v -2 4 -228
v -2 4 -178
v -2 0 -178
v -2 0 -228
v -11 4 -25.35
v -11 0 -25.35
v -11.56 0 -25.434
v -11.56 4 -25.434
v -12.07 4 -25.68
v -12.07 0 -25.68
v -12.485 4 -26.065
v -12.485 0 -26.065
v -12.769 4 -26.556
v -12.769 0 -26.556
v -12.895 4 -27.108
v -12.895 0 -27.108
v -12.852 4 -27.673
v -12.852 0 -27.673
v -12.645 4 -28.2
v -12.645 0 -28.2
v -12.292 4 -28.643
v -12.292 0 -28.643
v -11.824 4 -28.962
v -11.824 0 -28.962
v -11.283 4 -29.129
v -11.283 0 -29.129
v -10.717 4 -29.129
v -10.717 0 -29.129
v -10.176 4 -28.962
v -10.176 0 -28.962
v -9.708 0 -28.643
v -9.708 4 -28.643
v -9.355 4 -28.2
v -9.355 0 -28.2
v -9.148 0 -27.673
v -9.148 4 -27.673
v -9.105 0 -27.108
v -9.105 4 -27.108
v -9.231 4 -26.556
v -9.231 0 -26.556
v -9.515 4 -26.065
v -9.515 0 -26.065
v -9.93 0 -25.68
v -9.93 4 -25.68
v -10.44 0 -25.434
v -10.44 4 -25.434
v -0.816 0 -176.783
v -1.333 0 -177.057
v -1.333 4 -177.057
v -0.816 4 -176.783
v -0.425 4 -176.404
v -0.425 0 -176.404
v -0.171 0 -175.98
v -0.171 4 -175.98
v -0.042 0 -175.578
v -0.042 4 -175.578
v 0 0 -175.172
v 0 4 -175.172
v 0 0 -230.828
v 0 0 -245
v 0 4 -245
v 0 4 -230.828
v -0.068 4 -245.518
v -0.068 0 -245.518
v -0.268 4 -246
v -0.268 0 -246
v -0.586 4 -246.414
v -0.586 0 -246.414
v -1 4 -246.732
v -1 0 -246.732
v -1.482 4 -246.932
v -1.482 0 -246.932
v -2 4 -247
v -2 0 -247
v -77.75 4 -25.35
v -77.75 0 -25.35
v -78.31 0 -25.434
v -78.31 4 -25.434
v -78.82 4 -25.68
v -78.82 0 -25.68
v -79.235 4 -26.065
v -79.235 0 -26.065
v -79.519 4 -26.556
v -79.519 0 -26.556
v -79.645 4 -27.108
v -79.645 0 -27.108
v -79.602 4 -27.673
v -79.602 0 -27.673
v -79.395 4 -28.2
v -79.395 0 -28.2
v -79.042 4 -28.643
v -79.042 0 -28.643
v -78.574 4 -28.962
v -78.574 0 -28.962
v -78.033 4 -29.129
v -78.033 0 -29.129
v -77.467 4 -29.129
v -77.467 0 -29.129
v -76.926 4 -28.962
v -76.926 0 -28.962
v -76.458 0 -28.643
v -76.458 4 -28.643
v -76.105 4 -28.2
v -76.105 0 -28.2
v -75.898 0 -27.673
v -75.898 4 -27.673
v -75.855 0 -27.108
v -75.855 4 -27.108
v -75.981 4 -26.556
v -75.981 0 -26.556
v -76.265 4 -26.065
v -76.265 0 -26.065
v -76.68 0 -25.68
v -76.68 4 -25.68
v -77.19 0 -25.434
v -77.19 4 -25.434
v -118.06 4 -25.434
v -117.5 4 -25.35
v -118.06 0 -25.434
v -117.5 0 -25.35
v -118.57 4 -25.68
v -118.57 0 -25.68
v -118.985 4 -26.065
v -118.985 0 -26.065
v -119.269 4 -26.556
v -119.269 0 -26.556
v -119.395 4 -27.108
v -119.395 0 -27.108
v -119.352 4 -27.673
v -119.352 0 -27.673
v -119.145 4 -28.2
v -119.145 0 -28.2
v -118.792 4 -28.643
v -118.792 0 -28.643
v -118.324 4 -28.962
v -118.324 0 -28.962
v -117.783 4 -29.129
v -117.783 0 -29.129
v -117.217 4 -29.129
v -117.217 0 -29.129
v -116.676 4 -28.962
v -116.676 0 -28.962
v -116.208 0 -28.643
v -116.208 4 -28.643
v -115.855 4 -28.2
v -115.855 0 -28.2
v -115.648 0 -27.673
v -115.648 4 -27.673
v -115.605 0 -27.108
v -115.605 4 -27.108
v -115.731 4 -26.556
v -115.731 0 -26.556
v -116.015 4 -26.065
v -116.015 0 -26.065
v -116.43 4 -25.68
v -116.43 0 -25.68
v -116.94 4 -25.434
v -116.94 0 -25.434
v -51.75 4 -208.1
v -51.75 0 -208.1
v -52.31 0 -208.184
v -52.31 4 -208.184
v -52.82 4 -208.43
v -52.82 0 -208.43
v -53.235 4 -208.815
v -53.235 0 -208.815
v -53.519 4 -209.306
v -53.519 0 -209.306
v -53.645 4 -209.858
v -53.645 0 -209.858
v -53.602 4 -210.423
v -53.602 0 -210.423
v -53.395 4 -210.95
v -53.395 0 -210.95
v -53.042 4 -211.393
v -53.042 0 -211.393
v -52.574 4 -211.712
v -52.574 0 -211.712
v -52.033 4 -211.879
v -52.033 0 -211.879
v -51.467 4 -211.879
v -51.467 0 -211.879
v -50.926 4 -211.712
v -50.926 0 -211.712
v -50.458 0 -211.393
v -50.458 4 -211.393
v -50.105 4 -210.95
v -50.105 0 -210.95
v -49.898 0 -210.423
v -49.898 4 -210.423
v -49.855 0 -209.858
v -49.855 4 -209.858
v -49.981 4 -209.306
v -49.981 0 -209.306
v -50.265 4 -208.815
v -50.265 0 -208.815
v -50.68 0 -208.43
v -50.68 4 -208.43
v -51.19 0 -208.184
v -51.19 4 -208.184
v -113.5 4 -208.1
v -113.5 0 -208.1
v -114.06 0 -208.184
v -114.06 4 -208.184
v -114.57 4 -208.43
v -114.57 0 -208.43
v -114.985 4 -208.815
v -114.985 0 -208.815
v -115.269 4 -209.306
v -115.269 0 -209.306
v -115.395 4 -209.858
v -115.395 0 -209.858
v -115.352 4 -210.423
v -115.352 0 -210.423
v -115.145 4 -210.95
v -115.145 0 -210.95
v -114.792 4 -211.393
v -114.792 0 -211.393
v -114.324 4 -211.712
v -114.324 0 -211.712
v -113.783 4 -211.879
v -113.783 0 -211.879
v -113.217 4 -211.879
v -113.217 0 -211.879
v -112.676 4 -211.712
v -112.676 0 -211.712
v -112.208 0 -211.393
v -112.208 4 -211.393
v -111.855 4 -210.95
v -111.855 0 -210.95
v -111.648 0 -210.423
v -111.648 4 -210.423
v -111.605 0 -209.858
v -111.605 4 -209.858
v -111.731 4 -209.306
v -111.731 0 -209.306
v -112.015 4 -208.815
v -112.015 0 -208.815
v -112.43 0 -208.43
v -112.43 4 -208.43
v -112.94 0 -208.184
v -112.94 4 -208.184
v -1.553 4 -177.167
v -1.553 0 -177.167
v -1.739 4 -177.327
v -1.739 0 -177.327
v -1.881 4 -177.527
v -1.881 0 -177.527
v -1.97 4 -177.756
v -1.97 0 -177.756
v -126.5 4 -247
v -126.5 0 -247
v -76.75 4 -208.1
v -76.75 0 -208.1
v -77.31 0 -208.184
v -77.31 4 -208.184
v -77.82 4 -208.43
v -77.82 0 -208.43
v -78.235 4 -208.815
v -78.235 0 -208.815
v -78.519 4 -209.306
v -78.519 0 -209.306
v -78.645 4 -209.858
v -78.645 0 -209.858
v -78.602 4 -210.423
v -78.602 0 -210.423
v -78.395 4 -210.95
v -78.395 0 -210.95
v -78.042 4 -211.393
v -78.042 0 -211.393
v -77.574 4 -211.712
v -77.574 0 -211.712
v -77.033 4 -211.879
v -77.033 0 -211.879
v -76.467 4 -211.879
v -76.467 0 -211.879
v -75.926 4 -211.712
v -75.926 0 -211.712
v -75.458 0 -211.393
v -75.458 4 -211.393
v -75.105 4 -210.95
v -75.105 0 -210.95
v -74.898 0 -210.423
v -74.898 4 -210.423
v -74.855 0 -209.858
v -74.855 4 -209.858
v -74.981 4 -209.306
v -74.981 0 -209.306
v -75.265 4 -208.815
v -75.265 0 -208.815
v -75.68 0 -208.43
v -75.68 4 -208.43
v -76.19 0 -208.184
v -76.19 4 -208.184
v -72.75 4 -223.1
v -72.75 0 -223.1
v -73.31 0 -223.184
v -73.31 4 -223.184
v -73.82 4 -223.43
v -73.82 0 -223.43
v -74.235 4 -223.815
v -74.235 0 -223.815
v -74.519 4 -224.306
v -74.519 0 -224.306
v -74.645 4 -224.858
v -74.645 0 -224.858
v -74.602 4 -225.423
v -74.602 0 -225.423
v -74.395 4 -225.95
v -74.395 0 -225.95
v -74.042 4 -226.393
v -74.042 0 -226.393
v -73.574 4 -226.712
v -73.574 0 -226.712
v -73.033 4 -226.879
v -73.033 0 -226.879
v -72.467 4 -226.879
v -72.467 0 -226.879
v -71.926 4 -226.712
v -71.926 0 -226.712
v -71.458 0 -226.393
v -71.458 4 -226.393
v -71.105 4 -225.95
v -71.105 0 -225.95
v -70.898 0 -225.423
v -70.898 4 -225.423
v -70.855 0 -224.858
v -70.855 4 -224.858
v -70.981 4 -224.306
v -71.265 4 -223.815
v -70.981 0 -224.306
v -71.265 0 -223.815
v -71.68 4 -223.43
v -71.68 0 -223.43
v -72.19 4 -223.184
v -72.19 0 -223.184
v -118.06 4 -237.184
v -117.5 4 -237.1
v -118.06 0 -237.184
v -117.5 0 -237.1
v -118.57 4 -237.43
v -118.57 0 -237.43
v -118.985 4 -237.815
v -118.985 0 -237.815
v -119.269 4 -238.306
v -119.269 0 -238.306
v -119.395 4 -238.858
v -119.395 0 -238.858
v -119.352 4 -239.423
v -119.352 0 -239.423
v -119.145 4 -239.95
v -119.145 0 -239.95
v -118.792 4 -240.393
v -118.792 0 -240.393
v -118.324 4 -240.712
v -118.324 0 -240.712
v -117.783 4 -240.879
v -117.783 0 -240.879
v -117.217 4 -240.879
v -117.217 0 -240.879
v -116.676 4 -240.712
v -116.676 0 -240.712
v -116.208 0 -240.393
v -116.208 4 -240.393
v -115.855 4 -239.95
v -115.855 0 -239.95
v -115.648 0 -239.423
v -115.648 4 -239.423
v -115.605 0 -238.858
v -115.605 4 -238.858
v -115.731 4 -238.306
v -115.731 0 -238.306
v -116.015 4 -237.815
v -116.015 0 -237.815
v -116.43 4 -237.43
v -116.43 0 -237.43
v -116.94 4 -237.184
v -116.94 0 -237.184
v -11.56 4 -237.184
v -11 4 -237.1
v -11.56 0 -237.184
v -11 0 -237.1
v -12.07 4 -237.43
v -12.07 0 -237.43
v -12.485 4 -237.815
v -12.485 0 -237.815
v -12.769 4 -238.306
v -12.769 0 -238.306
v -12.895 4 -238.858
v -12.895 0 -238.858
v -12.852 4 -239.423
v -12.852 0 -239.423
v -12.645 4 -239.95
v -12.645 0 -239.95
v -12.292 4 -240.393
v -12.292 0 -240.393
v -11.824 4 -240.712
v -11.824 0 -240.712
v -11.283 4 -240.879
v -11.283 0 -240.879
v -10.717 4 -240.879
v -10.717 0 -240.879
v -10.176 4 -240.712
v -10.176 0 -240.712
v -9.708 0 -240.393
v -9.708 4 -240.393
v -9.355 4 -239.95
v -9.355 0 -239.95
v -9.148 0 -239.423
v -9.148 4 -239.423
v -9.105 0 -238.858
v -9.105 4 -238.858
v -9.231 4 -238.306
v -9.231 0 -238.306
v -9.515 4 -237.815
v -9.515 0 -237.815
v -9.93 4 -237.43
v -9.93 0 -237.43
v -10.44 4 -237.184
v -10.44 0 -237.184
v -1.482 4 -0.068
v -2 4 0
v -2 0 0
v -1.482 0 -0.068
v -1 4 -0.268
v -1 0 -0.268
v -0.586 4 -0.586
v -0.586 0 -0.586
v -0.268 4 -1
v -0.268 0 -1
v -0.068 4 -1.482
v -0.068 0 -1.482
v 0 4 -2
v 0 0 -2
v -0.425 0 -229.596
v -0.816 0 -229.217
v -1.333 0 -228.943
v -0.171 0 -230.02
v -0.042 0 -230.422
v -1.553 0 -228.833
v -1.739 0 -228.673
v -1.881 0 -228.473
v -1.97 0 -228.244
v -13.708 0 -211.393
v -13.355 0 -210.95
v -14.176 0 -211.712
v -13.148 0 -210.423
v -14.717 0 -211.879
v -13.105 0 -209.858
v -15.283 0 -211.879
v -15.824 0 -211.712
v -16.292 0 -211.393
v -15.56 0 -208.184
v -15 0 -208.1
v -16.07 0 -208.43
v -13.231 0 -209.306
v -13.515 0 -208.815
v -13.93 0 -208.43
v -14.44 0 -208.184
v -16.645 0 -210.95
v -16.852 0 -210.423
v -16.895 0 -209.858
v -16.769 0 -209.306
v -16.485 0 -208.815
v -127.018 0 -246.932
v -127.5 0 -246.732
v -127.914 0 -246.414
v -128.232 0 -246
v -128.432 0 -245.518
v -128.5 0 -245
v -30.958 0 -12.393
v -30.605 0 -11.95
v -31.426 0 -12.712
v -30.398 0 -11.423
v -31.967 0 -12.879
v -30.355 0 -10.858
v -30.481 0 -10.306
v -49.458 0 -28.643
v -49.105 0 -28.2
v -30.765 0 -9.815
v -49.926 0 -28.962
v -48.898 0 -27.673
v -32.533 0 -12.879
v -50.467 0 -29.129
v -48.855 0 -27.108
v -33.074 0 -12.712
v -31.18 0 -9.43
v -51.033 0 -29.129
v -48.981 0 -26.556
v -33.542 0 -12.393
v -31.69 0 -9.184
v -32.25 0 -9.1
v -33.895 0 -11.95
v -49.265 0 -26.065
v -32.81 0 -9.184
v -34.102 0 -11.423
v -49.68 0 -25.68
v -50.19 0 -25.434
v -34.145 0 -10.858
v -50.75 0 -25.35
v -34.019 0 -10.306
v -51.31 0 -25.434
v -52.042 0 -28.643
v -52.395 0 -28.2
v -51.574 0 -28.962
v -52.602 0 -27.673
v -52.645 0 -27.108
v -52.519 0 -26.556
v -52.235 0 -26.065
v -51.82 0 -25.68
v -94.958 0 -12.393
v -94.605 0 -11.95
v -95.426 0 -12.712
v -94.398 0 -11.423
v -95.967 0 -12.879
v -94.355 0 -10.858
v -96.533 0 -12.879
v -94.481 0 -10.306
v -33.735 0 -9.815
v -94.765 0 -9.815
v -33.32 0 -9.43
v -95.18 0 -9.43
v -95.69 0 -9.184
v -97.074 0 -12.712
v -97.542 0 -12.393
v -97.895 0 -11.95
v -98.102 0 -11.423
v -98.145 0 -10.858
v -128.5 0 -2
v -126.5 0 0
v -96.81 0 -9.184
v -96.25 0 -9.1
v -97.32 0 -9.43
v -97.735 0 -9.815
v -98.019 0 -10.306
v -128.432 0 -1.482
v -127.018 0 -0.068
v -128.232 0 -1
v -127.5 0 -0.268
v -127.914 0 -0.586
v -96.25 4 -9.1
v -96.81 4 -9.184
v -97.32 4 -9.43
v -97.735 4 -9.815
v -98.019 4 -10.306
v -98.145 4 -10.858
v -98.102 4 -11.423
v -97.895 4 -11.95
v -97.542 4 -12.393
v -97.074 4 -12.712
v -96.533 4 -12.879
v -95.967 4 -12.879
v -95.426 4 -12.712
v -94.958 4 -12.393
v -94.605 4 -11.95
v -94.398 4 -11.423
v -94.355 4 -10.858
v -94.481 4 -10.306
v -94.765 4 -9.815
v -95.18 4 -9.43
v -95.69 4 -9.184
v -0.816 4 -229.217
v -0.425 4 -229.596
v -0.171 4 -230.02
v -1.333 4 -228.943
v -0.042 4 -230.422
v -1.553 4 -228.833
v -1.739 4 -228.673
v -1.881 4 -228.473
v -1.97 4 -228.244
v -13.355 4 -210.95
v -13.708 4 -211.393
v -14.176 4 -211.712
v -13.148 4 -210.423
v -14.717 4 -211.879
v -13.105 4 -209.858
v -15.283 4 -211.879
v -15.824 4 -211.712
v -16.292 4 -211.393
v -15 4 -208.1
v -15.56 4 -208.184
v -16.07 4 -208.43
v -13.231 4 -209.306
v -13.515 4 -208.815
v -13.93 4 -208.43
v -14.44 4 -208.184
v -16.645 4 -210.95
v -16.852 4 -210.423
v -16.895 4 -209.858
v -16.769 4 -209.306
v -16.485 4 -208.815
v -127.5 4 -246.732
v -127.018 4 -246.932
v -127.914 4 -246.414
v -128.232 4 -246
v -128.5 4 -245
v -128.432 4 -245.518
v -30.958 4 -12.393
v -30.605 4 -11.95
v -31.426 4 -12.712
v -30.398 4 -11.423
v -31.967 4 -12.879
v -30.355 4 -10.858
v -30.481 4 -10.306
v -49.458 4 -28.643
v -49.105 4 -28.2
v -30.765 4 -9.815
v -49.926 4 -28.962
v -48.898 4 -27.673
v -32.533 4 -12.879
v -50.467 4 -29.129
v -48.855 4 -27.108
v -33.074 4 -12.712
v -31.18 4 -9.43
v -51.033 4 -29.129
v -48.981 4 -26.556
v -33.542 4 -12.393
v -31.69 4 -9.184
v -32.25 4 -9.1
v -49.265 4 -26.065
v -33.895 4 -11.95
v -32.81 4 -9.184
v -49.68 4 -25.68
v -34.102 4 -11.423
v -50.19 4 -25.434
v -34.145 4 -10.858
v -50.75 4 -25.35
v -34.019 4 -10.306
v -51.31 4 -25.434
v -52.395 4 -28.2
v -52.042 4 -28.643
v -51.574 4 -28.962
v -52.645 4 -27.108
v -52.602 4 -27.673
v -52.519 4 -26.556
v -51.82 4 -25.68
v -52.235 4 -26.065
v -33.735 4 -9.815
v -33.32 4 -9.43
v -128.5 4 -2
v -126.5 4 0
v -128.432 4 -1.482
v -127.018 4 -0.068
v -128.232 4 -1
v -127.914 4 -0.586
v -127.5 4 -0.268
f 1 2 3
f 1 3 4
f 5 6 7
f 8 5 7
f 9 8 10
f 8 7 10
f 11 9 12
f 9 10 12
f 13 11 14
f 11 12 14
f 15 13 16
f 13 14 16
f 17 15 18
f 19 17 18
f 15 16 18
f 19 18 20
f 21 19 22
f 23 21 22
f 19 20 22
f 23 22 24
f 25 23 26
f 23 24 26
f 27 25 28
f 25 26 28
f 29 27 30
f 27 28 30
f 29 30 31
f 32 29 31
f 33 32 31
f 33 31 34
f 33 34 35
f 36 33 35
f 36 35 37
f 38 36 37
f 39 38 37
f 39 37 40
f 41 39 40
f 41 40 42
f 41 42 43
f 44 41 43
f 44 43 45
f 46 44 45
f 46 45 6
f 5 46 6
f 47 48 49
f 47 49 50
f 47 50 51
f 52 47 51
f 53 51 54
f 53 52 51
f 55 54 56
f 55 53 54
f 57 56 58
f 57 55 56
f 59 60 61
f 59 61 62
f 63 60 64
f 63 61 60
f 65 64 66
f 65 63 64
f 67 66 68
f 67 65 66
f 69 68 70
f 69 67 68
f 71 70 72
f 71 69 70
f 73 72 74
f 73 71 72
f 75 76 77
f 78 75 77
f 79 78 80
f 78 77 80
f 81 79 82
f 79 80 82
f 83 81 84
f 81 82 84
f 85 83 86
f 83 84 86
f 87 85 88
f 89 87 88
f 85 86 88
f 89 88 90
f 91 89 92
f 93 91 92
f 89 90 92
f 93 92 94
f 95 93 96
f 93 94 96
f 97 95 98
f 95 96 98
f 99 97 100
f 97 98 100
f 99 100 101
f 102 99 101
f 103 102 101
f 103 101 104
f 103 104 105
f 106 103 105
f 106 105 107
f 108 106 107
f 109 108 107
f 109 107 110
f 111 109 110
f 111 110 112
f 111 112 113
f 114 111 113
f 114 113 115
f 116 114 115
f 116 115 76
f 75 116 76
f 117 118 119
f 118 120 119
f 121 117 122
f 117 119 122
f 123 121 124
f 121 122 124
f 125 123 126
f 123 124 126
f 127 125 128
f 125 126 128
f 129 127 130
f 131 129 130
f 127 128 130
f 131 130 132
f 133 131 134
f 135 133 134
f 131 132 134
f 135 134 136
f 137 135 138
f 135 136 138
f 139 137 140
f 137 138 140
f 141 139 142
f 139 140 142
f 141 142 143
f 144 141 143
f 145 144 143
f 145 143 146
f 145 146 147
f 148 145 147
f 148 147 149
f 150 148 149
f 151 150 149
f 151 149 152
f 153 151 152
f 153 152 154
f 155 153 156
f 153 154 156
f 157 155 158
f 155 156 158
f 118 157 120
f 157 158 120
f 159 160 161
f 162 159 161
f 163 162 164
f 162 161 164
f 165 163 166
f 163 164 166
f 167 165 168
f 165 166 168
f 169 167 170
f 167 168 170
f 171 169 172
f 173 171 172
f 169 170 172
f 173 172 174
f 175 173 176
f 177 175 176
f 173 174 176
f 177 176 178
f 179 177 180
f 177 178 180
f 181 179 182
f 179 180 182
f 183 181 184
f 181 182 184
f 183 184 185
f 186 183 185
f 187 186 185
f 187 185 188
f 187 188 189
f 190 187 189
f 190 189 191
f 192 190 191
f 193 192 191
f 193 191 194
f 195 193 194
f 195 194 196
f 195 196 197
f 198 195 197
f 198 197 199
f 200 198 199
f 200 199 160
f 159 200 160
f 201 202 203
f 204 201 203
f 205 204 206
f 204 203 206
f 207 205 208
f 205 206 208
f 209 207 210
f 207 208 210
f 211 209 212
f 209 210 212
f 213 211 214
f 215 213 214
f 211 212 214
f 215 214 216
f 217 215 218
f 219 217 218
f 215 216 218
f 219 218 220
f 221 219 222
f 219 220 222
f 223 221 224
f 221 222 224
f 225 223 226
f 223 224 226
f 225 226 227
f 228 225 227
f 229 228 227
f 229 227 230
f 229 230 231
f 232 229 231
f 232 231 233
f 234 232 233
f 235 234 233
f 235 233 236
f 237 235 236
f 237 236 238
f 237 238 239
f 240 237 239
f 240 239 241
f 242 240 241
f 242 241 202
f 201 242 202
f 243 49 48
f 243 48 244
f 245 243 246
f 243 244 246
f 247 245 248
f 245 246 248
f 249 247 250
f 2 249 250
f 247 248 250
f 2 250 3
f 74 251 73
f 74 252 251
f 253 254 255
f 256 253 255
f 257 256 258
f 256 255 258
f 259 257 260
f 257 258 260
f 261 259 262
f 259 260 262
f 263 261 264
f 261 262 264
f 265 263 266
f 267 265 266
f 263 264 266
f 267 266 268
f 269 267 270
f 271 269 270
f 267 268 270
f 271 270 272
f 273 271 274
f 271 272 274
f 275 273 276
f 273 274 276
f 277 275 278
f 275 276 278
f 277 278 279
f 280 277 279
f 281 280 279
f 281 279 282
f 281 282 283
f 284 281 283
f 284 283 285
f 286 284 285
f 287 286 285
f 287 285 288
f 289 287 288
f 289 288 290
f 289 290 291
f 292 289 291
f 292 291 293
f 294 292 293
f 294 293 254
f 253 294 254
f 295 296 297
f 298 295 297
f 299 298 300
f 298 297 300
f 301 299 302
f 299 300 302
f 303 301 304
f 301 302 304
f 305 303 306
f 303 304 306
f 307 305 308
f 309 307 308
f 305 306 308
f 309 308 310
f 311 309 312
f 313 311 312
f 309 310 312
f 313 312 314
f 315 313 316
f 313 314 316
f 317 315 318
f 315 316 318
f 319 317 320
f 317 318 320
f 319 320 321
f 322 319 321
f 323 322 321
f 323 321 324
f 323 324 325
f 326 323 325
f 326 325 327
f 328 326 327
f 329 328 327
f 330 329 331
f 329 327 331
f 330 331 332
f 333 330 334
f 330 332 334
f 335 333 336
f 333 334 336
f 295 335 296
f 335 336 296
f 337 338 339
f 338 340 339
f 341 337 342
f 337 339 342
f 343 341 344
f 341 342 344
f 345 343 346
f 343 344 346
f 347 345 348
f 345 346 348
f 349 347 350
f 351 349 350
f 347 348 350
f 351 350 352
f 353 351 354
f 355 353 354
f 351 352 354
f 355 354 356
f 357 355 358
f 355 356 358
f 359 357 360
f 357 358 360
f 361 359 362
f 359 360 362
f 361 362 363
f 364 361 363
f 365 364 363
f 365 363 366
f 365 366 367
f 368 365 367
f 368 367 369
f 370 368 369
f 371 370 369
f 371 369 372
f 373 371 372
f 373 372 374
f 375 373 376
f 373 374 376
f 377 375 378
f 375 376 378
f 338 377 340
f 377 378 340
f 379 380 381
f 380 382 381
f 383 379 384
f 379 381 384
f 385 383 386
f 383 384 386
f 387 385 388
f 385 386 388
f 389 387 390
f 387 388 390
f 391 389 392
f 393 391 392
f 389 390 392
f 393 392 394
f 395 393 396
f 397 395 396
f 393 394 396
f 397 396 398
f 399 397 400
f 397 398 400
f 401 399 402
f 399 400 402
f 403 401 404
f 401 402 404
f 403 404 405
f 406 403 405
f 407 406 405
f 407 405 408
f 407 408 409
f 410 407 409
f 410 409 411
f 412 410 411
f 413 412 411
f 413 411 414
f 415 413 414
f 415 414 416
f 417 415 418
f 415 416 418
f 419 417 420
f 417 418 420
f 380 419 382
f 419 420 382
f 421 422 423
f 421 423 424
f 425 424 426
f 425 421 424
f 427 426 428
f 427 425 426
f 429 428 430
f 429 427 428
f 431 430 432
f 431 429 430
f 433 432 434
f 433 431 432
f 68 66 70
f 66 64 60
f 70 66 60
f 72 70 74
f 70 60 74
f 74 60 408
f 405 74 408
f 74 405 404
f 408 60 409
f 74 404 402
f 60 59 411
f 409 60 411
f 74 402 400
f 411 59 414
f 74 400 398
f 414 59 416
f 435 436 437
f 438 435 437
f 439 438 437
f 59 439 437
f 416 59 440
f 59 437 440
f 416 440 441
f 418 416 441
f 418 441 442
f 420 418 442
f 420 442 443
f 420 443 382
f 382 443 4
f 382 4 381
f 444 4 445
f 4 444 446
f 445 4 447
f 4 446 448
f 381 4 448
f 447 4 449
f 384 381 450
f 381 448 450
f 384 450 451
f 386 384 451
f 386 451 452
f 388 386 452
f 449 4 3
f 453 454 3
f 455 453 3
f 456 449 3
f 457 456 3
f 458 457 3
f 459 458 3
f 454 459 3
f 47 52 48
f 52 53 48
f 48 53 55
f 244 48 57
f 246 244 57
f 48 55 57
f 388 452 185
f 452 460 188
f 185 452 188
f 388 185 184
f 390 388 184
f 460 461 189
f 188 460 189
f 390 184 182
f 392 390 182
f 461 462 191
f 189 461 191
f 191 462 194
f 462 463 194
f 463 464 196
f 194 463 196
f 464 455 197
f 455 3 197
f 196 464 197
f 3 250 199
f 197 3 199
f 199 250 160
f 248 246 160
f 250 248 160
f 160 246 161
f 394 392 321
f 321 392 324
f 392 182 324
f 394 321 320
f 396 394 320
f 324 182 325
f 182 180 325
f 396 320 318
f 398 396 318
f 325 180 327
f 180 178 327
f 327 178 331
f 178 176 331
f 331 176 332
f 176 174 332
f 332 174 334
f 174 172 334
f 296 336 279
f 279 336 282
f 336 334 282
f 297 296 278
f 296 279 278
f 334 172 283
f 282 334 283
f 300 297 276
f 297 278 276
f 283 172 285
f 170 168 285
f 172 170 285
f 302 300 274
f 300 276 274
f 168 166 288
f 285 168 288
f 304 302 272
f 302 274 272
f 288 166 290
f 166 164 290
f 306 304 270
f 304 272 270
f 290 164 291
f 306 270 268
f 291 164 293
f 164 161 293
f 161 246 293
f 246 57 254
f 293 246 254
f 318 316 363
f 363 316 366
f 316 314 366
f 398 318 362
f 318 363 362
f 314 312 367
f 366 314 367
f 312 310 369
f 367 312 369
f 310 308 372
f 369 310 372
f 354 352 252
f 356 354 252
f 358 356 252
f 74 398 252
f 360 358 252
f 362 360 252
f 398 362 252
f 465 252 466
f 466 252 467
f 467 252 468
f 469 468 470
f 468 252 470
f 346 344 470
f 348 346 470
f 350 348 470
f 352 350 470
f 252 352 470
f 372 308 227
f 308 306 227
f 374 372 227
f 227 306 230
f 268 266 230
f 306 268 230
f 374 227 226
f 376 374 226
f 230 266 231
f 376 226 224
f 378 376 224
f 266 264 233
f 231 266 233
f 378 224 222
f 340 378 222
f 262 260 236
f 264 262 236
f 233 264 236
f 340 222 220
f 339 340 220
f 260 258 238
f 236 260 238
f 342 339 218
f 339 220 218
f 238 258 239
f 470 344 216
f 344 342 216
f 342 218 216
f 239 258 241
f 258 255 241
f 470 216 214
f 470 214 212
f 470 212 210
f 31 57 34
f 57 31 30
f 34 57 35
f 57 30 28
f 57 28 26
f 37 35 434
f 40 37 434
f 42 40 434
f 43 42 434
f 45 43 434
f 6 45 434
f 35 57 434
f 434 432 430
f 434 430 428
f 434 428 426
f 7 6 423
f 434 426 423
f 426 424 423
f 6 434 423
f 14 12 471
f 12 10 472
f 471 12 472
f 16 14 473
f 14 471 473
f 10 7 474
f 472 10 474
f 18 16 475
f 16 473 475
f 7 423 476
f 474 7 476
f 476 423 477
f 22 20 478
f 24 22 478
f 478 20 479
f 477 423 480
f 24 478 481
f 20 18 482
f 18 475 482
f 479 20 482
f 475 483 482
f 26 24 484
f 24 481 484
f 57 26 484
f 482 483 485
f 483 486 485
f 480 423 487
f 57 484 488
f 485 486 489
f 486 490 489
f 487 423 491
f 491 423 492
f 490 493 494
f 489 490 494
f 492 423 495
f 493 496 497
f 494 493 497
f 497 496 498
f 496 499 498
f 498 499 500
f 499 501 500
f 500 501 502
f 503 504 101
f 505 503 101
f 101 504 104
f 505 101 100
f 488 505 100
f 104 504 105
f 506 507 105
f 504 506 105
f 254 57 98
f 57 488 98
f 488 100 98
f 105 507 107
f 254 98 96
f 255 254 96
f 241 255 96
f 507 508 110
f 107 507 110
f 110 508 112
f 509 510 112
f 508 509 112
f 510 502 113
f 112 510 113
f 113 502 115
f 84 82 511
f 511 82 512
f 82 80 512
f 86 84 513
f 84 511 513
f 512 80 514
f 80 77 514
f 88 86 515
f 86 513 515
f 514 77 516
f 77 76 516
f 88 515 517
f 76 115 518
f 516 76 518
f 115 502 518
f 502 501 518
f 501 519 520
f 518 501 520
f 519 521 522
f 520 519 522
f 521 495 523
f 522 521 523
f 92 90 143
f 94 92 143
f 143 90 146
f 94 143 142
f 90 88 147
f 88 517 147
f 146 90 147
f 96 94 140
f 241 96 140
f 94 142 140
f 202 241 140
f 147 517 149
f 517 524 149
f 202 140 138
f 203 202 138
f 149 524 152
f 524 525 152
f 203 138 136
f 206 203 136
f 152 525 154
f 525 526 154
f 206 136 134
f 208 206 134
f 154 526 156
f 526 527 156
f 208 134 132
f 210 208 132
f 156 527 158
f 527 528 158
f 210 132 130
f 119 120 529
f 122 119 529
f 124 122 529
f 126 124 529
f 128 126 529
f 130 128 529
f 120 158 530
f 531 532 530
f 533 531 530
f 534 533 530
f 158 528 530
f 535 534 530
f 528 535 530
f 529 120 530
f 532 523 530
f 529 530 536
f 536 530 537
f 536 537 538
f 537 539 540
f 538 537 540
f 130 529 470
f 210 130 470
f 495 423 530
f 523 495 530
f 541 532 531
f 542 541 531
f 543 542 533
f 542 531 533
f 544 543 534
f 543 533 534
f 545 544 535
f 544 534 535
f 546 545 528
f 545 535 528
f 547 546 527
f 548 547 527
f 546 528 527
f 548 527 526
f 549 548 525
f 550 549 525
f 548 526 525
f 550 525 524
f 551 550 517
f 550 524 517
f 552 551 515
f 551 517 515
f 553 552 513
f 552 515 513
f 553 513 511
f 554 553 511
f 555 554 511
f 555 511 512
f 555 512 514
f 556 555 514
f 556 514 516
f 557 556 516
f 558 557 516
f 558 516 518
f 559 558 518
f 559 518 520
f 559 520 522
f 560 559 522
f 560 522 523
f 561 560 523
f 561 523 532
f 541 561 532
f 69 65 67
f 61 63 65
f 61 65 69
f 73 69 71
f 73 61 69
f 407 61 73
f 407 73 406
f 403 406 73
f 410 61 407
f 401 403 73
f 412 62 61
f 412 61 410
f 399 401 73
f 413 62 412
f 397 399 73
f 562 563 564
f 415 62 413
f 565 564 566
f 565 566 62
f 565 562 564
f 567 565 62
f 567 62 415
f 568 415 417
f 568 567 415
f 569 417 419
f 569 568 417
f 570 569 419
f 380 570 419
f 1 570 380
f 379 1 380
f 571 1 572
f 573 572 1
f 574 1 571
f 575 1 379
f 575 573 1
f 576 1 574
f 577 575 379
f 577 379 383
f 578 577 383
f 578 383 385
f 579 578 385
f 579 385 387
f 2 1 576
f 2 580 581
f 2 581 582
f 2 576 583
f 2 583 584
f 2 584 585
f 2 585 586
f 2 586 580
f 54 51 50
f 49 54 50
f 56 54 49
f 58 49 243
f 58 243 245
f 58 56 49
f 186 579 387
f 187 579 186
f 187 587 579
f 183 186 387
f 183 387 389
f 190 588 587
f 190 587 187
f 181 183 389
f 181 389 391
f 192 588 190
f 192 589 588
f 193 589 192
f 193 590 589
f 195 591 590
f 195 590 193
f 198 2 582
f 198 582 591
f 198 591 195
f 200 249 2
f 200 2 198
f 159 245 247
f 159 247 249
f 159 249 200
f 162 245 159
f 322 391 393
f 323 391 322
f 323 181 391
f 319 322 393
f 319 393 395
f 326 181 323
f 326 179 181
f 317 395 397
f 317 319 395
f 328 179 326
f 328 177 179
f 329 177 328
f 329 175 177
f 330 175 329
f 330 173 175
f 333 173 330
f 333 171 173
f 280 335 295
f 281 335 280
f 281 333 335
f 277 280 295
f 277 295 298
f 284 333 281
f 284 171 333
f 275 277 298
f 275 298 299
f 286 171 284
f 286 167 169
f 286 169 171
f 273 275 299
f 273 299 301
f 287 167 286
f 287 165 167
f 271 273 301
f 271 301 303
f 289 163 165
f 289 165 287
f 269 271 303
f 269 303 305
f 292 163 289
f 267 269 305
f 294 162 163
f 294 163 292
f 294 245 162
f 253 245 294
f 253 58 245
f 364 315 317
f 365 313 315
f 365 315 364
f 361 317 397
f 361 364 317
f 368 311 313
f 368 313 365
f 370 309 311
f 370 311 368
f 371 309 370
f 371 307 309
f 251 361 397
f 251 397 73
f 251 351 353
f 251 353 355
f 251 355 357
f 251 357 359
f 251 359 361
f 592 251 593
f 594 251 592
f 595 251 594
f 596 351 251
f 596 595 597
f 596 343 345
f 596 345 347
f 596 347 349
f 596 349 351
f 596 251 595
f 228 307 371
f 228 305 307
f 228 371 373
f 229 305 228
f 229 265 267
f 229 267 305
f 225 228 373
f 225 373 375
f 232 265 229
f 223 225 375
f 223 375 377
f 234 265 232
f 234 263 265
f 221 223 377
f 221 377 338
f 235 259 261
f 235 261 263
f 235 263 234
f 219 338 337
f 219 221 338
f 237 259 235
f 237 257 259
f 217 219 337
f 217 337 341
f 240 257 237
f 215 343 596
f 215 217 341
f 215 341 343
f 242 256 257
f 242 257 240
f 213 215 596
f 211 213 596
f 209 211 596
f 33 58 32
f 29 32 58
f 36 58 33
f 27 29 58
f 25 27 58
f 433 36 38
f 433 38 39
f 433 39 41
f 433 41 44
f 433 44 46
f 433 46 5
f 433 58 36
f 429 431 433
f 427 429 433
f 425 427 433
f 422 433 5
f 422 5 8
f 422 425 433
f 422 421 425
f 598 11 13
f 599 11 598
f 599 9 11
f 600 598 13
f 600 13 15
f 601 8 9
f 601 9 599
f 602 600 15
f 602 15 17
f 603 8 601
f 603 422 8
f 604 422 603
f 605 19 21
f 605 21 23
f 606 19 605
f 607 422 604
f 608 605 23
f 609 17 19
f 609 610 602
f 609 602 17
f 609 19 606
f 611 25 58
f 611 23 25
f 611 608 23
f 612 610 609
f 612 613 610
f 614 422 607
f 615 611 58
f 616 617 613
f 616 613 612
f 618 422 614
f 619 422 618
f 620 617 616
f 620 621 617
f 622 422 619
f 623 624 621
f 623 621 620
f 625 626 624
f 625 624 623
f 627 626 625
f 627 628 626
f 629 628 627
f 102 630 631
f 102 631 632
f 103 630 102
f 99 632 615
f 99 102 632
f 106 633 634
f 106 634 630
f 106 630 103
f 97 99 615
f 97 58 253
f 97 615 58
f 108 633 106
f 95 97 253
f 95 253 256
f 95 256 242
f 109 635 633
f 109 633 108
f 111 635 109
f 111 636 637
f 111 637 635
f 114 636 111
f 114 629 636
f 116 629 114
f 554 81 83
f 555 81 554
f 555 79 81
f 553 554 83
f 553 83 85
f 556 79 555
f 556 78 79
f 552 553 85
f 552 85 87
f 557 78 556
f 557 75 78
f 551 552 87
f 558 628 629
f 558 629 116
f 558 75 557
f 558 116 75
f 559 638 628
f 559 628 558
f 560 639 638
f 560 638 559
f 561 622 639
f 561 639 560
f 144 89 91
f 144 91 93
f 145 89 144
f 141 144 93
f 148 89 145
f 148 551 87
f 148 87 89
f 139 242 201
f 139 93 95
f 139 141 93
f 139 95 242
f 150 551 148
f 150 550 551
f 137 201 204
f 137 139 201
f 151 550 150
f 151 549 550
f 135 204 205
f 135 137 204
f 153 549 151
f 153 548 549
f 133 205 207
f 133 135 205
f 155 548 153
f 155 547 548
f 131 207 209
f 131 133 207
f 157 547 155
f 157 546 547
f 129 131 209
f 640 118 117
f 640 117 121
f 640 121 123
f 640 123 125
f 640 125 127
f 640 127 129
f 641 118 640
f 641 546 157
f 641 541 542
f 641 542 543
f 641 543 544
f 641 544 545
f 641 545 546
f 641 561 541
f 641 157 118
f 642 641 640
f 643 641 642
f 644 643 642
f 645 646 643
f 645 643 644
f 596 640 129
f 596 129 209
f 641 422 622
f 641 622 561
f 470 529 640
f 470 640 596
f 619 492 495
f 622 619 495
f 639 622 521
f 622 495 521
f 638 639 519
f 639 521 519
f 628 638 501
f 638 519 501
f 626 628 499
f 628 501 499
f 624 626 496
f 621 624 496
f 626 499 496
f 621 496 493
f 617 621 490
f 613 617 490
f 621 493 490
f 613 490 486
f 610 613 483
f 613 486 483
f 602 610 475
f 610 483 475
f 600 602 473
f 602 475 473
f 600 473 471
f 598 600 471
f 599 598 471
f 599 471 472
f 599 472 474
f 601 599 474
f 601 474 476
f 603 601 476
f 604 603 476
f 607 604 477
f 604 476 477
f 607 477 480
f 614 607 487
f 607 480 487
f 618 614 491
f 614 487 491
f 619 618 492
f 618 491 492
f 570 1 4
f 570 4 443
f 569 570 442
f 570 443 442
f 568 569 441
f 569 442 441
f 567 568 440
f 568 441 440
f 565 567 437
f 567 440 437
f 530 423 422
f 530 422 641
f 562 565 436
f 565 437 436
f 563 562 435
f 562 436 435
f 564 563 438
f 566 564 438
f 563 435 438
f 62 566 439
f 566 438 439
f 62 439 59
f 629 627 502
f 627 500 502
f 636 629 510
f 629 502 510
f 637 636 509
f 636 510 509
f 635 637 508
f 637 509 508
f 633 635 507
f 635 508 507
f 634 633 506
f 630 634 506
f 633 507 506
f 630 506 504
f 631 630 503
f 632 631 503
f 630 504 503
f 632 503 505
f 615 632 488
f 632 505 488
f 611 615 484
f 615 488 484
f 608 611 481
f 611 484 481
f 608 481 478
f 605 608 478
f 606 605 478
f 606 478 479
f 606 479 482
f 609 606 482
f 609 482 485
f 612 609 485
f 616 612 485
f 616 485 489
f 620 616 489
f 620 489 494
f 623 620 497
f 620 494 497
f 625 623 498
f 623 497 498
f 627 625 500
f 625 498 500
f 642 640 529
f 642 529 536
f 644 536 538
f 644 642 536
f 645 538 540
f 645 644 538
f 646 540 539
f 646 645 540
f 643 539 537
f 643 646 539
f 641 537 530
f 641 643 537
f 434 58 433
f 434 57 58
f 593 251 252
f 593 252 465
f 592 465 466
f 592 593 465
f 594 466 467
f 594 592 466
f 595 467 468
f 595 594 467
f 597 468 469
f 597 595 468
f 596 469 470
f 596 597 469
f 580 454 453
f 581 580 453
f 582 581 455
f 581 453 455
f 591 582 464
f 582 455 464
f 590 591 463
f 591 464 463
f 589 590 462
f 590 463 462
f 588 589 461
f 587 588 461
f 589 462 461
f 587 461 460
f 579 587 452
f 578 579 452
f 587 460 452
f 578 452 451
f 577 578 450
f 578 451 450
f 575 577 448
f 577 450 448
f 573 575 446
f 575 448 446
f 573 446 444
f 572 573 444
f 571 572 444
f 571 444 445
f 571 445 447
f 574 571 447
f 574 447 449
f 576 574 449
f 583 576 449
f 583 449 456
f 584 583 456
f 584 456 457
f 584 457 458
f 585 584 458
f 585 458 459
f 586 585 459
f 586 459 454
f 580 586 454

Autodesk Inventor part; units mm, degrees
ref_plane "YZ Plane" through (0, 0, 0) normal (1, 0, 0) x (0, 1, 0)
ref_plane "XZ Plane" through (0, 0, 0) normal (0, 1, 0) x (-1, 0, 0)
ref_plane "XY Plane" through (0, 0, 0) normal (0, 0, 1) x (1, 0, 0)
sketch "Sketch1" plane through (0, 0, 0) normal (0, 1, 0) x (-1, 0, 0)
  line L0 (0, 0) -> (128.5, 0)
  line L1 (128.5, 0) -> (128.5, -247)
  line L2 (128.5, -247) -> (0, -247)
  line L3 (0, -247) -> (0, 0)
  dimension "d0" = 128.5
  dimension "d1" = 247
extrude "Extrusion1" add sketch "Sketch1" along normal blind 4
sketch "Sketch2" plane through (0, 4, 0) normal (0, 1, 0) x (1, 0, 0)
  line L0 (0, 0) -> (0, 247) projected
  line L1 (0, 177) -> (-2, 177)
  line L2 (-2, 177) -> (-2, 229)
  line L3 (-2, 229) -> (0, 229)
  line L4 (0, 229) -> (0, 177)
  line L5 (-128.5, 0) -> (0, 0) projected
  line L6 (0, 247) -> (-128.5, 247) projected
  point P0 (0, 229)
  dimension "d6" = 2
  dimension "d9" = 18
  dimension "d10" = 70
extrude "Extrusion2" cut sketch "Sketch2" against normal blind 4
fillet "Fillet1" radius 1 2 edges at (-2, 2, -229) (-2, 2, -177)
sketch "Sketch3" plane through (0, 4, 0) normal (0, 1, 0) x (1, 0, 0)
  line L0 (-117.5, -38.6181) -> (-117.5, 315.6014) construction
  line L1 (-187.6527, 11) -> (40.6594, 11) construction
  line L2 (-11, -30.2243) -> (-11, 315.6014) construction
  line L3 (-64.25, -57.9239) -> (-64.25, 315.6014) construction
  line L4 (-128.5, 0) -> (0, 0) construction
  line L5 (-128.5, 247) -> (-128.5, 0) construction
  line L6 (0, 0) -> (0, 177) construction
  line L7 (-187.6527, 27.25) -> (32.1527, 27.25) construction
  line L8 (0, 247) -> (-128.5, 247) projected
  point P0 (-64.25, 0)
  point P1 (-11, 27.25)
  point P2 (-117.5, 27.25)
  point P3 (-50.75, 27.25)
  point P4 (-77.75, 27.25)
  point P5 (-96.25, 11)
  point P6 (-32.25, 11)
  point P7 (-117.5, 239)
  point P8 (-11, 239)
  point P9 (-72.75, 225)
  dimension "d12" = 11
  dimension "d13" = 11
  dimension "d14" = 11
  dimension "d15" = 27.25
  dimension "d16" = 13.5
  dimension "d17" = 13.5
  dimension "d18" = 32
  dimension "d19" = 32
  dimension "d27" = 8
  dimension "d28" = 8
  dimension "d29" = 8.5
  dimension "d30" = 22
hole "Hole1" at (-11, 4, -27.25) at (-117.5, 4, -27.25) at (-50.75, 4, -27.25) at (-77.75, 4, -27.25) at (-96.25, 4, -11) at (-32.25, 4, -11) at (-117.5, 4, -239) at (-72.75, 4, -225) at (-11, 4, -239) direction (0, -1, 0) diameter 3.8 end through all
sketch "Sketch4" plane through (0, 4, 0) normal (0, 1, 0) x (1, 0, 0)
  circle A0 centre (-72.75, 225) radius 1.9 projected
  circle A1 centre (-32.25, 11) radius 1.9 projected
  circle A2 centre (-77.75, 27.25) radius 1.9 projected
  circle A3 centre (-117.5, 27.25) radius 1.9 projected
  circle A4 centre (-11, 27.25) radius 1.9 projected
  circle A5 centre (-50.75, 27.25) radius 1.9 projected
  circle A6 centre (-96.25, 11) radius 1.9 projected
  circle A7 centre (-117.5, 239) radius 1.9 projected
  circle A8 centre (-11, 239) radius 1.9 projected
  line L0 (-1, 229) -> (0, 229) projected
  line L1 (0, 229) -> (0, 247) projected
  line L2 (0, 247) -> (-128.5, 247) projected
  line L3 (-128.5, 247) -> (-128.5, 0) projected
  line L4 (-128.5, 0) -> (0, 0) projected
  line L5 (0, 0) -> (0, 177) projected
  line L6 (0, 177) -> (-1, 177) projected
  arc A9 (-2, 178) -> (-1, 177) centre (-1, 178) ccw projected
  line L7 (-2, 178) -> (-2, 228) projected
  arc A10 (-1, 229) -> (-2, 228) centre (-1, 228) ccw projected
  line L8 (-146.6271, 210) -> (41.5181, 210) construction
  line L9 (-64.25, -27.386) -> (-64.25, 314.2803) construction
  point P0 (-64.25, 247)
  point P1 (-113.5, 210)
  point P2 (-76.75, 210)
  point P3 (-51.75, 210)
  point P4 (-15, 210)
  dimension "d31" = 37
  dimension "d32" = 15
  dimension "d33" = 15
  dimension "d34" = 12.5
  dimension "d35" = 12.5
hole "Hole2" at (-113.5, 4, -210) at (-76.75, 4, -210) at (-51.75, 4, -210) at (-15, 4, -210) direction (0, -1, 0) diameter 3.8 end through all
fillet "Fillet2" radius 2 6 edges at (0, 2, -229) (0, 2, -177) (0, 2, -247) (-128.5, 2, -247) (0, 2, 0) (-128.5, 2, 0)
properties part number "Battery Cover"
